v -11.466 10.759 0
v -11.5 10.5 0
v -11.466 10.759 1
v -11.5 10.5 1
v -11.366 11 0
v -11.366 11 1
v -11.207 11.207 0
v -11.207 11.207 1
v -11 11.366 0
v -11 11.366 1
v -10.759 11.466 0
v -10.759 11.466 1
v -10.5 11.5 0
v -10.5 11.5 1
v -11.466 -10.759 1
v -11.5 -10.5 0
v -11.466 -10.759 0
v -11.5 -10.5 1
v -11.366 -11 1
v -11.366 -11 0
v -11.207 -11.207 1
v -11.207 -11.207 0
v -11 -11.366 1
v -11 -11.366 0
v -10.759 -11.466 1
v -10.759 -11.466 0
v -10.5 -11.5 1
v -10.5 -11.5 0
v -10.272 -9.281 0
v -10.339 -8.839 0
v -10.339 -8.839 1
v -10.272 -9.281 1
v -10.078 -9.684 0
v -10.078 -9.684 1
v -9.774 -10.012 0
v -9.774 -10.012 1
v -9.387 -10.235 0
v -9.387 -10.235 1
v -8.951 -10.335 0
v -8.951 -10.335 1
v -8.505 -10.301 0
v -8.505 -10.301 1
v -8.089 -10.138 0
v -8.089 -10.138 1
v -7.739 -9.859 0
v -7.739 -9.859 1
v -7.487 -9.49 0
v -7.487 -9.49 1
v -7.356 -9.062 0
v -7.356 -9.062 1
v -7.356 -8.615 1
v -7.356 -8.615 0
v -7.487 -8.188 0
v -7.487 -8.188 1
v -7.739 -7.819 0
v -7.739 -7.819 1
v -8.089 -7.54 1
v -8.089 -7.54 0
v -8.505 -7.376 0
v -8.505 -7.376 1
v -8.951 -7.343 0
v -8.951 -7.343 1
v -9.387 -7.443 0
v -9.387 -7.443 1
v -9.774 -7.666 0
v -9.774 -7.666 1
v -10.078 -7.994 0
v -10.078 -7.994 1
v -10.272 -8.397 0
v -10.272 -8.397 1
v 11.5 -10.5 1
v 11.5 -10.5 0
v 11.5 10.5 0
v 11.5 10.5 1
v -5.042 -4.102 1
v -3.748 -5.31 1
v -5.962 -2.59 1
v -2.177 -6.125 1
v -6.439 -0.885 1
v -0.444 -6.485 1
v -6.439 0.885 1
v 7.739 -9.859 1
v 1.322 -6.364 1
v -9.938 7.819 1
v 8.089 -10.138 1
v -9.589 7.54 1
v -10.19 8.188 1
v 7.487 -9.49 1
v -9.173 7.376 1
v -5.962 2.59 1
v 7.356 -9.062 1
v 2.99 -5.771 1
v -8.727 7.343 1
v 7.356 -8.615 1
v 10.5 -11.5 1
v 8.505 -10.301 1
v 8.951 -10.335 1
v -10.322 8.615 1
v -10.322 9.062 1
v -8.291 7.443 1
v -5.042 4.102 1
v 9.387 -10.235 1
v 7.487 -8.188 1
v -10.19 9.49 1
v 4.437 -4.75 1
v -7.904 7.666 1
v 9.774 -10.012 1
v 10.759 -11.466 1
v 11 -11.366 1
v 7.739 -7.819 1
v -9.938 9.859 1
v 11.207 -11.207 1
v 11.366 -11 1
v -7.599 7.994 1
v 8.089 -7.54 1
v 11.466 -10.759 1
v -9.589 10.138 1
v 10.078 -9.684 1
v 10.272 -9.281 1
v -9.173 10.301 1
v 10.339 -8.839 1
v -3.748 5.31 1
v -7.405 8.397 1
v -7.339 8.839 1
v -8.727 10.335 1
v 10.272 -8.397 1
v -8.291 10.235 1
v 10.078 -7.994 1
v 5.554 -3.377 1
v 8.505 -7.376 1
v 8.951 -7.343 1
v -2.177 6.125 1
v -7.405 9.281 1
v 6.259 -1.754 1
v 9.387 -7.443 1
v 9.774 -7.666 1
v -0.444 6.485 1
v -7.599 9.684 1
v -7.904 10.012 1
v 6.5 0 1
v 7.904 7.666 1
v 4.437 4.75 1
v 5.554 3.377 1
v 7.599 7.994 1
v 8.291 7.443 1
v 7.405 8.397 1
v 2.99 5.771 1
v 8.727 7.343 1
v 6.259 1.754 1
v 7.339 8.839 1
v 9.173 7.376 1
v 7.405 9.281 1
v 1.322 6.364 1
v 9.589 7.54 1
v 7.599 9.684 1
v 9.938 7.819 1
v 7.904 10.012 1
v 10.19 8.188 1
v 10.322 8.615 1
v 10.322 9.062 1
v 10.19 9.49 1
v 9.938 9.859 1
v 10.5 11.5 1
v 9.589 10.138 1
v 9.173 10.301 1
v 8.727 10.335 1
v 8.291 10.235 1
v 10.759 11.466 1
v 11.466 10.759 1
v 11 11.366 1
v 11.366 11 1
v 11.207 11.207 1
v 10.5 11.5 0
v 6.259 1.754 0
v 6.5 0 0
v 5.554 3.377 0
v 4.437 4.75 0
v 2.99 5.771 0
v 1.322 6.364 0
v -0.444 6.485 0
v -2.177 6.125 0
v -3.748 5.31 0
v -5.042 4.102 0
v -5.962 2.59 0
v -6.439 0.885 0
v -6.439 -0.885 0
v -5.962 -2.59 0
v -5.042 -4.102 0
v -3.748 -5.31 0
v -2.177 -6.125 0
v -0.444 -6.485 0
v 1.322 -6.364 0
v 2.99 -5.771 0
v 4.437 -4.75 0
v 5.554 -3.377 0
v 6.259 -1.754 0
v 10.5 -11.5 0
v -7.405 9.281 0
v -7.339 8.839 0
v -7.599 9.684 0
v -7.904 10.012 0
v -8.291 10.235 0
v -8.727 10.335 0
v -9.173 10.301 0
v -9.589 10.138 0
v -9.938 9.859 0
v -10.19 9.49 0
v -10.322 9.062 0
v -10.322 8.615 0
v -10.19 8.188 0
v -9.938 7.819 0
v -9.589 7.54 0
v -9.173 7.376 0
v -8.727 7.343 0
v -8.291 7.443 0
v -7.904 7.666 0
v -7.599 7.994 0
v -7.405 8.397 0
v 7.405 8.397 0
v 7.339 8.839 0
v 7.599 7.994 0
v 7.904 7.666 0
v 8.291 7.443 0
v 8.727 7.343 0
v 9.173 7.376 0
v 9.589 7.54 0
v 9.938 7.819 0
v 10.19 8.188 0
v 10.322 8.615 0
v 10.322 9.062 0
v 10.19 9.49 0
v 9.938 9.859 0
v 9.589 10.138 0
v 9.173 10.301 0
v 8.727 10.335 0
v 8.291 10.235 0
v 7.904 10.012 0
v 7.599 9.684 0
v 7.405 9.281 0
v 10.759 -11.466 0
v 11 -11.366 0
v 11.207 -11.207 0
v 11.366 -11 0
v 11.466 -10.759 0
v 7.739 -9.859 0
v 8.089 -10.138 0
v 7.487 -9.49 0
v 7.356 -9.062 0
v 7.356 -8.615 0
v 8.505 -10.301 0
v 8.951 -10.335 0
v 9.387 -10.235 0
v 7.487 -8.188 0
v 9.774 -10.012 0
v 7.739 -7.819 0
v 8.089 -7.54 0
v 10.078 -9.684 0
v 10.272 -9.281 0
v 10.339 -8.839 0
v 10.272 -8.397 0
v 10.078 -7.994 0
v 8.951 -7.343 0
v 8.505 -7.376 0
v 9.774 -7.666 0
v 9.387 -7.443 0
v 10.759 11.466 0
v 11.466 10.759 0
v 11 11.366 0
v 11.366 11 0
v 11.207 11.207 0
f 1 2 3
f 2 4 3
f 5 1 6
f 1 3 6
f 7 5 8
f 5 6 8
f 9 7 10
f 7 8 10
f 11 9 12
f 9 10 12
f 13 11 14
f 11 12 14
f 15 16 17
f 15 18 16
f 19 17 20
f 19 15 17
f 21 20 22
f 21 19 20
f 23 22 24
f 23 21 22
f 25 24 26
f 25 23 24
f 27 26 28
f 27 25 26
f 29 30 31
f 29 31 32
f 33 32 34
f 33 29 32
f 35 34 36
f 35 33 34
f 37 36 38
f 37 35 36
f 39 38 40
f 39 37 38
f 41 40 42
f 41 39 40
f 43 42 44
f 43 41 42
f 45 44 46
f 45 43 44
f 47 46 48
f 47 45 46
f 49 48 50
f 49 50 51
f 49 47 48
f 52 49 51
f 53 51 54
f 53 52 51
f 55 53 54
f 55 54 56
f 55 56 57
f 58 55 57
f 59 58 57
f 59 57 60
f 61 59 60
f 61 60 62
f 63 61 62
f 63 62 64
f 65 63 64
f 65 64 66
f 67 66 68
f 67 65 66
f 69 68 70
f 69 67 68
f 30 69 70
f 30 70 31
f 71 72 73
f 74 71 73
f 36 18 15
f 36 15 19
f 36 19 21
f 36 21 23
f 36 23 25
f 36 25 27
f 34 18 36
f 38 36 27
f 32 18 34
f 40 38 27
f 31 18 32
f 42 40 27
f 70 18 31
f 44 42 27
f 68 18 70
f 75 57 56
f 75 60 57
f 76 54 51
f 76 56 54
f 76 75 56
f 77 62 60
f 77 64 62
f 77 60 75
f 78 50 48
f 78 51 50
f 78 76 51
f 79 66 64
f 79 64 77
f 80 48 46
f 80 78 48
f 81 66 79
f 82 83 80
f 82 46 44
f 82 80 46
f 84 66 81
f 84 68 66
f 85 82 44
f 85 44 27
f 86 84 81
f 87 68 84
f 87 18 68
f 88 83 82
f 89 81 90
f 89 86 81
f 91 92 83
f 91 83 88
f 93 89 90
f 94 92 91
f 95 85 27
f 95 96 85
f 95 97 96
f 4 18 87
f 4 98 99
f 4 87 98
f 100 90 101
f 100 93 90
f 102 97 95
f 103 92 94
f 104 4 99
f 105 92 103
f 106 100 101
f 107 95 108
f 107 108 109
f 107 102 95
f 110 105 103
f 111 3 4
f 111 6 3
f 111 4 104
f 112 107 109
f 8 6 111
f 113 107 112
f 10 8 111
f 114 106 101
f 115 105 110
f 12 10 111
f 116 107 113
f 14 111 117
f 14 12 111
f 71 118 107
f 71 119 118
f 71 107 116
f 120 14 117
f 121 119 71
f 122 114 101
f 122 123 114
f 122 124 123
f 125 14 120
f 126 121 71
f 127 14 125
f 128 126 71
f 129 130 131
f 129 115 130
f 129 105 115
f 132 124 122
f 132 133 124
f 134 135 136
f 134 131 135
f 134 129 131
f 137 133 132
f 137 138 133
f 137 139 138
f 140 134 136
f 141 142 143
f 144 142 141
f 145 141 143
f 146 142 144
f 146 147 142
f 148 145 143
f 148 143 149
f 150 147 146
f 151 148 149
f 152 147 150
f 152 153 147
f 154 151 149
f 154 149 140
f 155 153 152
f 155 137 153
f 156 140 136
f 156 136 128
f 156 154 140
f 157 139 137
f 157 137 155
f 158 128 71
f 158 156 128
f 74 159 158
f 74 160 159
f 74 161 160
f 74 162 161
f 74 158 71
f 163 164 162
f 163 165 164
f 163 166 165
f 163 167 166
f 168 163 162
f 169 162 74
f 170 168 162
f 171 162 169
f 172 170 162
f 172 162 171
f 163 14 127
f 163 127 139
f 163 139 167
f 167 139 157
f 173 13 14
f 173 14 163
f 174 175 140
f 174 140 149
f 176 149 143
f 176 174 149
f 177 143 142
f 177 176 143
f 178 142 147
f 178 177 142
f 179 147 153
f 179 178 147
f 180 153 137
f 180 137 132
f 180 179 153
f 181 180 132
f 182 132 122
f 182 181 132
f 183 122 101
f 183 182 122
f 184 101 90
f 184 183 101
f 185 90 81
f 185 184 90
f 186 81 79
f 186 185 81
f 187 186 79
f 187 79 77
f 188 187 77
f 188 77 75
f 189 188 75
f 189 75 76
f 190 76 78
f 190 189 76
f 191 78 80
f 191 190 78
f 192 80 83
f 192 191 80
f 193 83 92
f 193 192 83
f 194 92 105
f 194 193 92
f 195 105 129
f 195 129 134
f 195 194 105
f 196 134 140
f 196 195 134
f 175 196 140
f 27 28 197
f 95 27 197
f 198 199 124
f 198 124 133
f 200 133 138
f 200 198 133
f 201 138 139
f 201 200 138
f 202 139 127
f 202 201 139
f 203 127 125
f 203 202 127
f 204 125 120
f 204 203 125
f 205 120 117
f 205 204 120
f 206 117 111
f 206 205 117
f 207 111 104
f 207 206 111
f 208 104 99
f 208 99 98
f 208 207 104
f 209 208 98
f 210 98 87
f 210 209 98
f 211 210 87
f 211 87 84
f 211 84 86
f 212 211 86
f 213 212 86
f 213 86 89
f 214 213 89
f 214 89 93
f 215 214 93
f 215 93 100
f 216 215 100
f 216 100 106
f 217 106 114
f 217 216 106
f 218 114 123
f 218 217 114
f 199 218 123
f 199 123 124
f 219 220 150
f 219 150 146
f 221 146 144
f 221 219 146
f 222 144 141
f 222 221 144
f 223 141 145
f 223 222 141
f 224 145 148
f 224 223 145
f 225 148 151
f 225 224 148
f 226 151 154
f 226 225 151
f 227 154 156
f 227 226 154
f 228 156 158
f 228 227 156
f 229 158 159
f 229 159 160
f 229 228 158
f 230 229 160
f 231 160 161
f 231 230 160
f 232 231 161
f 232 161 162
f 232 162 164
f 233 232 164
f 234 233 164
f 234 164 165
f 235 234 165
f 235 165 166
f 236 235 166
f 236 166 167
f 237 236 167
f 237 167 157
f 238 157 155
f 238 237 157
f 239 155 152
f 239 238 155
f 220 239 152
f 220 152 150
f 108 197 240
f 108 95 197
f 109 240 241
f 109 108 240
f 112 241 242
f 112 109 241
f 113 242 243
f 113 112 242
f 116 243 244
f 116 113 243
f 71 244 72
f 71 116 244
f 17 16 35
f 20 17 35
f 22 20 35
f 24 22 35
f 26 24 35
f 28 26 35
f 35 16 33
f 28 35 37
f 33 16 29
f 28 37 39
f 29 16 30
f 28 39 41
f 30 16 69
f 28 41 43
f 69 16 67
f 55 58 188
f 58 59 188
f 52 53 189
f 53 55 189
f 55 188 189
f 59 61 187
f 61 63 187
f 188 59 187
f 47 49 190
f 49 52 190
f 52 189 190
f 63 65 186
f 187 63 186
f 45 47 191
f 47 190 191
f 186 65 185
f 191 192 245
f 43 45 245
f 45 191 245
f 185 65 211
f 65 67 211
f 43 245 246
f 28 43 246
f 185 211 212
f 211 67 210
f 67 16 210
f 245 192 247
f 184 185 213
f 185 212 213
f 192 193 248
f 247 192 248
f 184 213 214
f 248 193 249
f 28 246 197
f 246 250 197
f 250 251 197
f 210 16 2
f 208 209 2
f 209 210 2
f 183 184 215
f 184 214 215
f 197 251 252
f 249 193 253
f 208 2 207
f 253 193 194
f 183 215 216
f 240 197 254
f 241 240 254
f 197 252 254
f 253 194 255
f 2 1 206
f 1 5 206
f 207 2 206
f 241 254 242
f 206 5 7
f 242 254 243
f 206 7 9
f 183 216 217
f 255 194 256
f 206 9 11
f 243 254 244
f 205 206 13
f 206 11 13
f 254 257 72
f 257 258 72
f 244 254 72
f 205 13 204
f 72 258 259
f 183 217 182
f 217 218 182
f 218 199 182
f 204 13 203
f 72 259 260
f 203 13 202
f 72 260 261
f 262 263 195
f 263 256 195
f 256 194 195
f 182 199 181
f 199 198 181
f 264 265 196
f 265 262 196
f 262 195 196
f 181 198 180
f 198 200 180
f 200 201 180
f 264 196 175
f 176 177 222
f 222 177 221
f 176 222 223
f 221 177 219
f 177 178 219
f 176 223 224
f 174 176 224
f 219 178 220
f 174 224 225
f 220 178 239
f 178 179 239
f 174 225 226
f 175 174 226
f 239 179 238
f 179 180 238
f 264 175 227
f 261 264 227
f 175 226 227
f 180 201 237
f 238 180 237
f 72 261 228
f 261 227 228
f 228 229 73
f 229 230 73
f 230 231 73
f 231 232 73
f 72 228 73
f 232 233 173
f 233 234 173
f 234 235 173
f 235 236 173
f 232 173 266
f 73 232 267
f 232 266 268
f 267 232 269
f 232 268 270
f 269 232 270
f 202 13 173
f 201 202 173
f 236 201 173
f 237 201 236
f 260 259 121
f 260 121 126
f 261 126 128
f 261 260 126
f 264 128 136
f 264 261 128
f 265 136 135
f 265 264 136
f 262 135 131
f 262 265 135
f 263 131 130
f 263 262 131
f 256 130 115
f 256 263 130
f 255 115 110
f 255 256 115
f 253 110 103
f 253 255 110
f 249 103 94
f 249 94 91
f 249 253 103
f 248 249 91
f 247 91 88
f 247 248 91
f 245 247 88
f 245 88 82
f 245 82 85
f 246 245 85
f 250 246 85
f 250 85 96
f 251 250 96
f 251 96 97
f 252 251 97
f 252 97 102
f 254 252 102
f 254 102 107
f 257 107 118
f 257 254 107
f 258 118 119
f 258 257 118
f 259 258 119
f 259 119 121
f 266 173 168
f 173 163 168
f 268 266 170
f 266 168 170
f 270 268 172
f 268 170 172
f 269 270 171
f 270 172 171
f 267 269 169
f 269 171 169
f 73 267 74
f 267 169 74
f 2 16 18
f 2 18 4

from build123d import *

# Parameters (mm, degrees)
SKETCH_1_W      = 23
SKETCH_1_H      = 23
SKETCH_1_R      = 1.5
SKETCH_1_R_2    = 6.5
EXTRUDE_1_DEPTH = 1
FILLET_1_R      = 1


with BuildPart() as part:
    # 草图1 → 凸台-拉伸1 (new body)
    with BuildSketch(Plane.XY):
        Rectangle(SKETCH_1_W, SKETCH_1_H)
        with Locations((-8.838834765, 8.838834765)):
            Circle(SKETCH_1_R, mode=Mode.SUBTRACT)
        with Locations(Location((-8.838834765, -8.838834765, 0), (0, 0, 180))):
            Circle(SKETCH_1_R, mode=Mode.SUBTRACT)
        with Locations((8.838834765, -8.838834765)):
            Circle(SKETCH_1_R, mode=Mode.SUBTRACT)
        with Locations(Location((8.838834765, 8.838834765, 0), (0, 0, 180))):
            Circle(SKETCH_1_R, mode=Mode.SUBTRACT)
        Circle(SKETCH_1_R_2, mode=Mode.SUBTRACT)
    extrude(amount=EXTRUDE_1_DEPTH)

    # 圆角1
    fillet_1_edges = [part.edges().sort_by_distance(p)[0] for p in [
        (-11.5, 11.5, 0.5),
        (11.5, 11.5, 0.5),
        (11.5, -11.5, 0.5),
        (-11.5, -11.5, 0.5),
    ]]
    fillet(fillet_1_edges, radius=FILLET_1_R)


solid = part.part
